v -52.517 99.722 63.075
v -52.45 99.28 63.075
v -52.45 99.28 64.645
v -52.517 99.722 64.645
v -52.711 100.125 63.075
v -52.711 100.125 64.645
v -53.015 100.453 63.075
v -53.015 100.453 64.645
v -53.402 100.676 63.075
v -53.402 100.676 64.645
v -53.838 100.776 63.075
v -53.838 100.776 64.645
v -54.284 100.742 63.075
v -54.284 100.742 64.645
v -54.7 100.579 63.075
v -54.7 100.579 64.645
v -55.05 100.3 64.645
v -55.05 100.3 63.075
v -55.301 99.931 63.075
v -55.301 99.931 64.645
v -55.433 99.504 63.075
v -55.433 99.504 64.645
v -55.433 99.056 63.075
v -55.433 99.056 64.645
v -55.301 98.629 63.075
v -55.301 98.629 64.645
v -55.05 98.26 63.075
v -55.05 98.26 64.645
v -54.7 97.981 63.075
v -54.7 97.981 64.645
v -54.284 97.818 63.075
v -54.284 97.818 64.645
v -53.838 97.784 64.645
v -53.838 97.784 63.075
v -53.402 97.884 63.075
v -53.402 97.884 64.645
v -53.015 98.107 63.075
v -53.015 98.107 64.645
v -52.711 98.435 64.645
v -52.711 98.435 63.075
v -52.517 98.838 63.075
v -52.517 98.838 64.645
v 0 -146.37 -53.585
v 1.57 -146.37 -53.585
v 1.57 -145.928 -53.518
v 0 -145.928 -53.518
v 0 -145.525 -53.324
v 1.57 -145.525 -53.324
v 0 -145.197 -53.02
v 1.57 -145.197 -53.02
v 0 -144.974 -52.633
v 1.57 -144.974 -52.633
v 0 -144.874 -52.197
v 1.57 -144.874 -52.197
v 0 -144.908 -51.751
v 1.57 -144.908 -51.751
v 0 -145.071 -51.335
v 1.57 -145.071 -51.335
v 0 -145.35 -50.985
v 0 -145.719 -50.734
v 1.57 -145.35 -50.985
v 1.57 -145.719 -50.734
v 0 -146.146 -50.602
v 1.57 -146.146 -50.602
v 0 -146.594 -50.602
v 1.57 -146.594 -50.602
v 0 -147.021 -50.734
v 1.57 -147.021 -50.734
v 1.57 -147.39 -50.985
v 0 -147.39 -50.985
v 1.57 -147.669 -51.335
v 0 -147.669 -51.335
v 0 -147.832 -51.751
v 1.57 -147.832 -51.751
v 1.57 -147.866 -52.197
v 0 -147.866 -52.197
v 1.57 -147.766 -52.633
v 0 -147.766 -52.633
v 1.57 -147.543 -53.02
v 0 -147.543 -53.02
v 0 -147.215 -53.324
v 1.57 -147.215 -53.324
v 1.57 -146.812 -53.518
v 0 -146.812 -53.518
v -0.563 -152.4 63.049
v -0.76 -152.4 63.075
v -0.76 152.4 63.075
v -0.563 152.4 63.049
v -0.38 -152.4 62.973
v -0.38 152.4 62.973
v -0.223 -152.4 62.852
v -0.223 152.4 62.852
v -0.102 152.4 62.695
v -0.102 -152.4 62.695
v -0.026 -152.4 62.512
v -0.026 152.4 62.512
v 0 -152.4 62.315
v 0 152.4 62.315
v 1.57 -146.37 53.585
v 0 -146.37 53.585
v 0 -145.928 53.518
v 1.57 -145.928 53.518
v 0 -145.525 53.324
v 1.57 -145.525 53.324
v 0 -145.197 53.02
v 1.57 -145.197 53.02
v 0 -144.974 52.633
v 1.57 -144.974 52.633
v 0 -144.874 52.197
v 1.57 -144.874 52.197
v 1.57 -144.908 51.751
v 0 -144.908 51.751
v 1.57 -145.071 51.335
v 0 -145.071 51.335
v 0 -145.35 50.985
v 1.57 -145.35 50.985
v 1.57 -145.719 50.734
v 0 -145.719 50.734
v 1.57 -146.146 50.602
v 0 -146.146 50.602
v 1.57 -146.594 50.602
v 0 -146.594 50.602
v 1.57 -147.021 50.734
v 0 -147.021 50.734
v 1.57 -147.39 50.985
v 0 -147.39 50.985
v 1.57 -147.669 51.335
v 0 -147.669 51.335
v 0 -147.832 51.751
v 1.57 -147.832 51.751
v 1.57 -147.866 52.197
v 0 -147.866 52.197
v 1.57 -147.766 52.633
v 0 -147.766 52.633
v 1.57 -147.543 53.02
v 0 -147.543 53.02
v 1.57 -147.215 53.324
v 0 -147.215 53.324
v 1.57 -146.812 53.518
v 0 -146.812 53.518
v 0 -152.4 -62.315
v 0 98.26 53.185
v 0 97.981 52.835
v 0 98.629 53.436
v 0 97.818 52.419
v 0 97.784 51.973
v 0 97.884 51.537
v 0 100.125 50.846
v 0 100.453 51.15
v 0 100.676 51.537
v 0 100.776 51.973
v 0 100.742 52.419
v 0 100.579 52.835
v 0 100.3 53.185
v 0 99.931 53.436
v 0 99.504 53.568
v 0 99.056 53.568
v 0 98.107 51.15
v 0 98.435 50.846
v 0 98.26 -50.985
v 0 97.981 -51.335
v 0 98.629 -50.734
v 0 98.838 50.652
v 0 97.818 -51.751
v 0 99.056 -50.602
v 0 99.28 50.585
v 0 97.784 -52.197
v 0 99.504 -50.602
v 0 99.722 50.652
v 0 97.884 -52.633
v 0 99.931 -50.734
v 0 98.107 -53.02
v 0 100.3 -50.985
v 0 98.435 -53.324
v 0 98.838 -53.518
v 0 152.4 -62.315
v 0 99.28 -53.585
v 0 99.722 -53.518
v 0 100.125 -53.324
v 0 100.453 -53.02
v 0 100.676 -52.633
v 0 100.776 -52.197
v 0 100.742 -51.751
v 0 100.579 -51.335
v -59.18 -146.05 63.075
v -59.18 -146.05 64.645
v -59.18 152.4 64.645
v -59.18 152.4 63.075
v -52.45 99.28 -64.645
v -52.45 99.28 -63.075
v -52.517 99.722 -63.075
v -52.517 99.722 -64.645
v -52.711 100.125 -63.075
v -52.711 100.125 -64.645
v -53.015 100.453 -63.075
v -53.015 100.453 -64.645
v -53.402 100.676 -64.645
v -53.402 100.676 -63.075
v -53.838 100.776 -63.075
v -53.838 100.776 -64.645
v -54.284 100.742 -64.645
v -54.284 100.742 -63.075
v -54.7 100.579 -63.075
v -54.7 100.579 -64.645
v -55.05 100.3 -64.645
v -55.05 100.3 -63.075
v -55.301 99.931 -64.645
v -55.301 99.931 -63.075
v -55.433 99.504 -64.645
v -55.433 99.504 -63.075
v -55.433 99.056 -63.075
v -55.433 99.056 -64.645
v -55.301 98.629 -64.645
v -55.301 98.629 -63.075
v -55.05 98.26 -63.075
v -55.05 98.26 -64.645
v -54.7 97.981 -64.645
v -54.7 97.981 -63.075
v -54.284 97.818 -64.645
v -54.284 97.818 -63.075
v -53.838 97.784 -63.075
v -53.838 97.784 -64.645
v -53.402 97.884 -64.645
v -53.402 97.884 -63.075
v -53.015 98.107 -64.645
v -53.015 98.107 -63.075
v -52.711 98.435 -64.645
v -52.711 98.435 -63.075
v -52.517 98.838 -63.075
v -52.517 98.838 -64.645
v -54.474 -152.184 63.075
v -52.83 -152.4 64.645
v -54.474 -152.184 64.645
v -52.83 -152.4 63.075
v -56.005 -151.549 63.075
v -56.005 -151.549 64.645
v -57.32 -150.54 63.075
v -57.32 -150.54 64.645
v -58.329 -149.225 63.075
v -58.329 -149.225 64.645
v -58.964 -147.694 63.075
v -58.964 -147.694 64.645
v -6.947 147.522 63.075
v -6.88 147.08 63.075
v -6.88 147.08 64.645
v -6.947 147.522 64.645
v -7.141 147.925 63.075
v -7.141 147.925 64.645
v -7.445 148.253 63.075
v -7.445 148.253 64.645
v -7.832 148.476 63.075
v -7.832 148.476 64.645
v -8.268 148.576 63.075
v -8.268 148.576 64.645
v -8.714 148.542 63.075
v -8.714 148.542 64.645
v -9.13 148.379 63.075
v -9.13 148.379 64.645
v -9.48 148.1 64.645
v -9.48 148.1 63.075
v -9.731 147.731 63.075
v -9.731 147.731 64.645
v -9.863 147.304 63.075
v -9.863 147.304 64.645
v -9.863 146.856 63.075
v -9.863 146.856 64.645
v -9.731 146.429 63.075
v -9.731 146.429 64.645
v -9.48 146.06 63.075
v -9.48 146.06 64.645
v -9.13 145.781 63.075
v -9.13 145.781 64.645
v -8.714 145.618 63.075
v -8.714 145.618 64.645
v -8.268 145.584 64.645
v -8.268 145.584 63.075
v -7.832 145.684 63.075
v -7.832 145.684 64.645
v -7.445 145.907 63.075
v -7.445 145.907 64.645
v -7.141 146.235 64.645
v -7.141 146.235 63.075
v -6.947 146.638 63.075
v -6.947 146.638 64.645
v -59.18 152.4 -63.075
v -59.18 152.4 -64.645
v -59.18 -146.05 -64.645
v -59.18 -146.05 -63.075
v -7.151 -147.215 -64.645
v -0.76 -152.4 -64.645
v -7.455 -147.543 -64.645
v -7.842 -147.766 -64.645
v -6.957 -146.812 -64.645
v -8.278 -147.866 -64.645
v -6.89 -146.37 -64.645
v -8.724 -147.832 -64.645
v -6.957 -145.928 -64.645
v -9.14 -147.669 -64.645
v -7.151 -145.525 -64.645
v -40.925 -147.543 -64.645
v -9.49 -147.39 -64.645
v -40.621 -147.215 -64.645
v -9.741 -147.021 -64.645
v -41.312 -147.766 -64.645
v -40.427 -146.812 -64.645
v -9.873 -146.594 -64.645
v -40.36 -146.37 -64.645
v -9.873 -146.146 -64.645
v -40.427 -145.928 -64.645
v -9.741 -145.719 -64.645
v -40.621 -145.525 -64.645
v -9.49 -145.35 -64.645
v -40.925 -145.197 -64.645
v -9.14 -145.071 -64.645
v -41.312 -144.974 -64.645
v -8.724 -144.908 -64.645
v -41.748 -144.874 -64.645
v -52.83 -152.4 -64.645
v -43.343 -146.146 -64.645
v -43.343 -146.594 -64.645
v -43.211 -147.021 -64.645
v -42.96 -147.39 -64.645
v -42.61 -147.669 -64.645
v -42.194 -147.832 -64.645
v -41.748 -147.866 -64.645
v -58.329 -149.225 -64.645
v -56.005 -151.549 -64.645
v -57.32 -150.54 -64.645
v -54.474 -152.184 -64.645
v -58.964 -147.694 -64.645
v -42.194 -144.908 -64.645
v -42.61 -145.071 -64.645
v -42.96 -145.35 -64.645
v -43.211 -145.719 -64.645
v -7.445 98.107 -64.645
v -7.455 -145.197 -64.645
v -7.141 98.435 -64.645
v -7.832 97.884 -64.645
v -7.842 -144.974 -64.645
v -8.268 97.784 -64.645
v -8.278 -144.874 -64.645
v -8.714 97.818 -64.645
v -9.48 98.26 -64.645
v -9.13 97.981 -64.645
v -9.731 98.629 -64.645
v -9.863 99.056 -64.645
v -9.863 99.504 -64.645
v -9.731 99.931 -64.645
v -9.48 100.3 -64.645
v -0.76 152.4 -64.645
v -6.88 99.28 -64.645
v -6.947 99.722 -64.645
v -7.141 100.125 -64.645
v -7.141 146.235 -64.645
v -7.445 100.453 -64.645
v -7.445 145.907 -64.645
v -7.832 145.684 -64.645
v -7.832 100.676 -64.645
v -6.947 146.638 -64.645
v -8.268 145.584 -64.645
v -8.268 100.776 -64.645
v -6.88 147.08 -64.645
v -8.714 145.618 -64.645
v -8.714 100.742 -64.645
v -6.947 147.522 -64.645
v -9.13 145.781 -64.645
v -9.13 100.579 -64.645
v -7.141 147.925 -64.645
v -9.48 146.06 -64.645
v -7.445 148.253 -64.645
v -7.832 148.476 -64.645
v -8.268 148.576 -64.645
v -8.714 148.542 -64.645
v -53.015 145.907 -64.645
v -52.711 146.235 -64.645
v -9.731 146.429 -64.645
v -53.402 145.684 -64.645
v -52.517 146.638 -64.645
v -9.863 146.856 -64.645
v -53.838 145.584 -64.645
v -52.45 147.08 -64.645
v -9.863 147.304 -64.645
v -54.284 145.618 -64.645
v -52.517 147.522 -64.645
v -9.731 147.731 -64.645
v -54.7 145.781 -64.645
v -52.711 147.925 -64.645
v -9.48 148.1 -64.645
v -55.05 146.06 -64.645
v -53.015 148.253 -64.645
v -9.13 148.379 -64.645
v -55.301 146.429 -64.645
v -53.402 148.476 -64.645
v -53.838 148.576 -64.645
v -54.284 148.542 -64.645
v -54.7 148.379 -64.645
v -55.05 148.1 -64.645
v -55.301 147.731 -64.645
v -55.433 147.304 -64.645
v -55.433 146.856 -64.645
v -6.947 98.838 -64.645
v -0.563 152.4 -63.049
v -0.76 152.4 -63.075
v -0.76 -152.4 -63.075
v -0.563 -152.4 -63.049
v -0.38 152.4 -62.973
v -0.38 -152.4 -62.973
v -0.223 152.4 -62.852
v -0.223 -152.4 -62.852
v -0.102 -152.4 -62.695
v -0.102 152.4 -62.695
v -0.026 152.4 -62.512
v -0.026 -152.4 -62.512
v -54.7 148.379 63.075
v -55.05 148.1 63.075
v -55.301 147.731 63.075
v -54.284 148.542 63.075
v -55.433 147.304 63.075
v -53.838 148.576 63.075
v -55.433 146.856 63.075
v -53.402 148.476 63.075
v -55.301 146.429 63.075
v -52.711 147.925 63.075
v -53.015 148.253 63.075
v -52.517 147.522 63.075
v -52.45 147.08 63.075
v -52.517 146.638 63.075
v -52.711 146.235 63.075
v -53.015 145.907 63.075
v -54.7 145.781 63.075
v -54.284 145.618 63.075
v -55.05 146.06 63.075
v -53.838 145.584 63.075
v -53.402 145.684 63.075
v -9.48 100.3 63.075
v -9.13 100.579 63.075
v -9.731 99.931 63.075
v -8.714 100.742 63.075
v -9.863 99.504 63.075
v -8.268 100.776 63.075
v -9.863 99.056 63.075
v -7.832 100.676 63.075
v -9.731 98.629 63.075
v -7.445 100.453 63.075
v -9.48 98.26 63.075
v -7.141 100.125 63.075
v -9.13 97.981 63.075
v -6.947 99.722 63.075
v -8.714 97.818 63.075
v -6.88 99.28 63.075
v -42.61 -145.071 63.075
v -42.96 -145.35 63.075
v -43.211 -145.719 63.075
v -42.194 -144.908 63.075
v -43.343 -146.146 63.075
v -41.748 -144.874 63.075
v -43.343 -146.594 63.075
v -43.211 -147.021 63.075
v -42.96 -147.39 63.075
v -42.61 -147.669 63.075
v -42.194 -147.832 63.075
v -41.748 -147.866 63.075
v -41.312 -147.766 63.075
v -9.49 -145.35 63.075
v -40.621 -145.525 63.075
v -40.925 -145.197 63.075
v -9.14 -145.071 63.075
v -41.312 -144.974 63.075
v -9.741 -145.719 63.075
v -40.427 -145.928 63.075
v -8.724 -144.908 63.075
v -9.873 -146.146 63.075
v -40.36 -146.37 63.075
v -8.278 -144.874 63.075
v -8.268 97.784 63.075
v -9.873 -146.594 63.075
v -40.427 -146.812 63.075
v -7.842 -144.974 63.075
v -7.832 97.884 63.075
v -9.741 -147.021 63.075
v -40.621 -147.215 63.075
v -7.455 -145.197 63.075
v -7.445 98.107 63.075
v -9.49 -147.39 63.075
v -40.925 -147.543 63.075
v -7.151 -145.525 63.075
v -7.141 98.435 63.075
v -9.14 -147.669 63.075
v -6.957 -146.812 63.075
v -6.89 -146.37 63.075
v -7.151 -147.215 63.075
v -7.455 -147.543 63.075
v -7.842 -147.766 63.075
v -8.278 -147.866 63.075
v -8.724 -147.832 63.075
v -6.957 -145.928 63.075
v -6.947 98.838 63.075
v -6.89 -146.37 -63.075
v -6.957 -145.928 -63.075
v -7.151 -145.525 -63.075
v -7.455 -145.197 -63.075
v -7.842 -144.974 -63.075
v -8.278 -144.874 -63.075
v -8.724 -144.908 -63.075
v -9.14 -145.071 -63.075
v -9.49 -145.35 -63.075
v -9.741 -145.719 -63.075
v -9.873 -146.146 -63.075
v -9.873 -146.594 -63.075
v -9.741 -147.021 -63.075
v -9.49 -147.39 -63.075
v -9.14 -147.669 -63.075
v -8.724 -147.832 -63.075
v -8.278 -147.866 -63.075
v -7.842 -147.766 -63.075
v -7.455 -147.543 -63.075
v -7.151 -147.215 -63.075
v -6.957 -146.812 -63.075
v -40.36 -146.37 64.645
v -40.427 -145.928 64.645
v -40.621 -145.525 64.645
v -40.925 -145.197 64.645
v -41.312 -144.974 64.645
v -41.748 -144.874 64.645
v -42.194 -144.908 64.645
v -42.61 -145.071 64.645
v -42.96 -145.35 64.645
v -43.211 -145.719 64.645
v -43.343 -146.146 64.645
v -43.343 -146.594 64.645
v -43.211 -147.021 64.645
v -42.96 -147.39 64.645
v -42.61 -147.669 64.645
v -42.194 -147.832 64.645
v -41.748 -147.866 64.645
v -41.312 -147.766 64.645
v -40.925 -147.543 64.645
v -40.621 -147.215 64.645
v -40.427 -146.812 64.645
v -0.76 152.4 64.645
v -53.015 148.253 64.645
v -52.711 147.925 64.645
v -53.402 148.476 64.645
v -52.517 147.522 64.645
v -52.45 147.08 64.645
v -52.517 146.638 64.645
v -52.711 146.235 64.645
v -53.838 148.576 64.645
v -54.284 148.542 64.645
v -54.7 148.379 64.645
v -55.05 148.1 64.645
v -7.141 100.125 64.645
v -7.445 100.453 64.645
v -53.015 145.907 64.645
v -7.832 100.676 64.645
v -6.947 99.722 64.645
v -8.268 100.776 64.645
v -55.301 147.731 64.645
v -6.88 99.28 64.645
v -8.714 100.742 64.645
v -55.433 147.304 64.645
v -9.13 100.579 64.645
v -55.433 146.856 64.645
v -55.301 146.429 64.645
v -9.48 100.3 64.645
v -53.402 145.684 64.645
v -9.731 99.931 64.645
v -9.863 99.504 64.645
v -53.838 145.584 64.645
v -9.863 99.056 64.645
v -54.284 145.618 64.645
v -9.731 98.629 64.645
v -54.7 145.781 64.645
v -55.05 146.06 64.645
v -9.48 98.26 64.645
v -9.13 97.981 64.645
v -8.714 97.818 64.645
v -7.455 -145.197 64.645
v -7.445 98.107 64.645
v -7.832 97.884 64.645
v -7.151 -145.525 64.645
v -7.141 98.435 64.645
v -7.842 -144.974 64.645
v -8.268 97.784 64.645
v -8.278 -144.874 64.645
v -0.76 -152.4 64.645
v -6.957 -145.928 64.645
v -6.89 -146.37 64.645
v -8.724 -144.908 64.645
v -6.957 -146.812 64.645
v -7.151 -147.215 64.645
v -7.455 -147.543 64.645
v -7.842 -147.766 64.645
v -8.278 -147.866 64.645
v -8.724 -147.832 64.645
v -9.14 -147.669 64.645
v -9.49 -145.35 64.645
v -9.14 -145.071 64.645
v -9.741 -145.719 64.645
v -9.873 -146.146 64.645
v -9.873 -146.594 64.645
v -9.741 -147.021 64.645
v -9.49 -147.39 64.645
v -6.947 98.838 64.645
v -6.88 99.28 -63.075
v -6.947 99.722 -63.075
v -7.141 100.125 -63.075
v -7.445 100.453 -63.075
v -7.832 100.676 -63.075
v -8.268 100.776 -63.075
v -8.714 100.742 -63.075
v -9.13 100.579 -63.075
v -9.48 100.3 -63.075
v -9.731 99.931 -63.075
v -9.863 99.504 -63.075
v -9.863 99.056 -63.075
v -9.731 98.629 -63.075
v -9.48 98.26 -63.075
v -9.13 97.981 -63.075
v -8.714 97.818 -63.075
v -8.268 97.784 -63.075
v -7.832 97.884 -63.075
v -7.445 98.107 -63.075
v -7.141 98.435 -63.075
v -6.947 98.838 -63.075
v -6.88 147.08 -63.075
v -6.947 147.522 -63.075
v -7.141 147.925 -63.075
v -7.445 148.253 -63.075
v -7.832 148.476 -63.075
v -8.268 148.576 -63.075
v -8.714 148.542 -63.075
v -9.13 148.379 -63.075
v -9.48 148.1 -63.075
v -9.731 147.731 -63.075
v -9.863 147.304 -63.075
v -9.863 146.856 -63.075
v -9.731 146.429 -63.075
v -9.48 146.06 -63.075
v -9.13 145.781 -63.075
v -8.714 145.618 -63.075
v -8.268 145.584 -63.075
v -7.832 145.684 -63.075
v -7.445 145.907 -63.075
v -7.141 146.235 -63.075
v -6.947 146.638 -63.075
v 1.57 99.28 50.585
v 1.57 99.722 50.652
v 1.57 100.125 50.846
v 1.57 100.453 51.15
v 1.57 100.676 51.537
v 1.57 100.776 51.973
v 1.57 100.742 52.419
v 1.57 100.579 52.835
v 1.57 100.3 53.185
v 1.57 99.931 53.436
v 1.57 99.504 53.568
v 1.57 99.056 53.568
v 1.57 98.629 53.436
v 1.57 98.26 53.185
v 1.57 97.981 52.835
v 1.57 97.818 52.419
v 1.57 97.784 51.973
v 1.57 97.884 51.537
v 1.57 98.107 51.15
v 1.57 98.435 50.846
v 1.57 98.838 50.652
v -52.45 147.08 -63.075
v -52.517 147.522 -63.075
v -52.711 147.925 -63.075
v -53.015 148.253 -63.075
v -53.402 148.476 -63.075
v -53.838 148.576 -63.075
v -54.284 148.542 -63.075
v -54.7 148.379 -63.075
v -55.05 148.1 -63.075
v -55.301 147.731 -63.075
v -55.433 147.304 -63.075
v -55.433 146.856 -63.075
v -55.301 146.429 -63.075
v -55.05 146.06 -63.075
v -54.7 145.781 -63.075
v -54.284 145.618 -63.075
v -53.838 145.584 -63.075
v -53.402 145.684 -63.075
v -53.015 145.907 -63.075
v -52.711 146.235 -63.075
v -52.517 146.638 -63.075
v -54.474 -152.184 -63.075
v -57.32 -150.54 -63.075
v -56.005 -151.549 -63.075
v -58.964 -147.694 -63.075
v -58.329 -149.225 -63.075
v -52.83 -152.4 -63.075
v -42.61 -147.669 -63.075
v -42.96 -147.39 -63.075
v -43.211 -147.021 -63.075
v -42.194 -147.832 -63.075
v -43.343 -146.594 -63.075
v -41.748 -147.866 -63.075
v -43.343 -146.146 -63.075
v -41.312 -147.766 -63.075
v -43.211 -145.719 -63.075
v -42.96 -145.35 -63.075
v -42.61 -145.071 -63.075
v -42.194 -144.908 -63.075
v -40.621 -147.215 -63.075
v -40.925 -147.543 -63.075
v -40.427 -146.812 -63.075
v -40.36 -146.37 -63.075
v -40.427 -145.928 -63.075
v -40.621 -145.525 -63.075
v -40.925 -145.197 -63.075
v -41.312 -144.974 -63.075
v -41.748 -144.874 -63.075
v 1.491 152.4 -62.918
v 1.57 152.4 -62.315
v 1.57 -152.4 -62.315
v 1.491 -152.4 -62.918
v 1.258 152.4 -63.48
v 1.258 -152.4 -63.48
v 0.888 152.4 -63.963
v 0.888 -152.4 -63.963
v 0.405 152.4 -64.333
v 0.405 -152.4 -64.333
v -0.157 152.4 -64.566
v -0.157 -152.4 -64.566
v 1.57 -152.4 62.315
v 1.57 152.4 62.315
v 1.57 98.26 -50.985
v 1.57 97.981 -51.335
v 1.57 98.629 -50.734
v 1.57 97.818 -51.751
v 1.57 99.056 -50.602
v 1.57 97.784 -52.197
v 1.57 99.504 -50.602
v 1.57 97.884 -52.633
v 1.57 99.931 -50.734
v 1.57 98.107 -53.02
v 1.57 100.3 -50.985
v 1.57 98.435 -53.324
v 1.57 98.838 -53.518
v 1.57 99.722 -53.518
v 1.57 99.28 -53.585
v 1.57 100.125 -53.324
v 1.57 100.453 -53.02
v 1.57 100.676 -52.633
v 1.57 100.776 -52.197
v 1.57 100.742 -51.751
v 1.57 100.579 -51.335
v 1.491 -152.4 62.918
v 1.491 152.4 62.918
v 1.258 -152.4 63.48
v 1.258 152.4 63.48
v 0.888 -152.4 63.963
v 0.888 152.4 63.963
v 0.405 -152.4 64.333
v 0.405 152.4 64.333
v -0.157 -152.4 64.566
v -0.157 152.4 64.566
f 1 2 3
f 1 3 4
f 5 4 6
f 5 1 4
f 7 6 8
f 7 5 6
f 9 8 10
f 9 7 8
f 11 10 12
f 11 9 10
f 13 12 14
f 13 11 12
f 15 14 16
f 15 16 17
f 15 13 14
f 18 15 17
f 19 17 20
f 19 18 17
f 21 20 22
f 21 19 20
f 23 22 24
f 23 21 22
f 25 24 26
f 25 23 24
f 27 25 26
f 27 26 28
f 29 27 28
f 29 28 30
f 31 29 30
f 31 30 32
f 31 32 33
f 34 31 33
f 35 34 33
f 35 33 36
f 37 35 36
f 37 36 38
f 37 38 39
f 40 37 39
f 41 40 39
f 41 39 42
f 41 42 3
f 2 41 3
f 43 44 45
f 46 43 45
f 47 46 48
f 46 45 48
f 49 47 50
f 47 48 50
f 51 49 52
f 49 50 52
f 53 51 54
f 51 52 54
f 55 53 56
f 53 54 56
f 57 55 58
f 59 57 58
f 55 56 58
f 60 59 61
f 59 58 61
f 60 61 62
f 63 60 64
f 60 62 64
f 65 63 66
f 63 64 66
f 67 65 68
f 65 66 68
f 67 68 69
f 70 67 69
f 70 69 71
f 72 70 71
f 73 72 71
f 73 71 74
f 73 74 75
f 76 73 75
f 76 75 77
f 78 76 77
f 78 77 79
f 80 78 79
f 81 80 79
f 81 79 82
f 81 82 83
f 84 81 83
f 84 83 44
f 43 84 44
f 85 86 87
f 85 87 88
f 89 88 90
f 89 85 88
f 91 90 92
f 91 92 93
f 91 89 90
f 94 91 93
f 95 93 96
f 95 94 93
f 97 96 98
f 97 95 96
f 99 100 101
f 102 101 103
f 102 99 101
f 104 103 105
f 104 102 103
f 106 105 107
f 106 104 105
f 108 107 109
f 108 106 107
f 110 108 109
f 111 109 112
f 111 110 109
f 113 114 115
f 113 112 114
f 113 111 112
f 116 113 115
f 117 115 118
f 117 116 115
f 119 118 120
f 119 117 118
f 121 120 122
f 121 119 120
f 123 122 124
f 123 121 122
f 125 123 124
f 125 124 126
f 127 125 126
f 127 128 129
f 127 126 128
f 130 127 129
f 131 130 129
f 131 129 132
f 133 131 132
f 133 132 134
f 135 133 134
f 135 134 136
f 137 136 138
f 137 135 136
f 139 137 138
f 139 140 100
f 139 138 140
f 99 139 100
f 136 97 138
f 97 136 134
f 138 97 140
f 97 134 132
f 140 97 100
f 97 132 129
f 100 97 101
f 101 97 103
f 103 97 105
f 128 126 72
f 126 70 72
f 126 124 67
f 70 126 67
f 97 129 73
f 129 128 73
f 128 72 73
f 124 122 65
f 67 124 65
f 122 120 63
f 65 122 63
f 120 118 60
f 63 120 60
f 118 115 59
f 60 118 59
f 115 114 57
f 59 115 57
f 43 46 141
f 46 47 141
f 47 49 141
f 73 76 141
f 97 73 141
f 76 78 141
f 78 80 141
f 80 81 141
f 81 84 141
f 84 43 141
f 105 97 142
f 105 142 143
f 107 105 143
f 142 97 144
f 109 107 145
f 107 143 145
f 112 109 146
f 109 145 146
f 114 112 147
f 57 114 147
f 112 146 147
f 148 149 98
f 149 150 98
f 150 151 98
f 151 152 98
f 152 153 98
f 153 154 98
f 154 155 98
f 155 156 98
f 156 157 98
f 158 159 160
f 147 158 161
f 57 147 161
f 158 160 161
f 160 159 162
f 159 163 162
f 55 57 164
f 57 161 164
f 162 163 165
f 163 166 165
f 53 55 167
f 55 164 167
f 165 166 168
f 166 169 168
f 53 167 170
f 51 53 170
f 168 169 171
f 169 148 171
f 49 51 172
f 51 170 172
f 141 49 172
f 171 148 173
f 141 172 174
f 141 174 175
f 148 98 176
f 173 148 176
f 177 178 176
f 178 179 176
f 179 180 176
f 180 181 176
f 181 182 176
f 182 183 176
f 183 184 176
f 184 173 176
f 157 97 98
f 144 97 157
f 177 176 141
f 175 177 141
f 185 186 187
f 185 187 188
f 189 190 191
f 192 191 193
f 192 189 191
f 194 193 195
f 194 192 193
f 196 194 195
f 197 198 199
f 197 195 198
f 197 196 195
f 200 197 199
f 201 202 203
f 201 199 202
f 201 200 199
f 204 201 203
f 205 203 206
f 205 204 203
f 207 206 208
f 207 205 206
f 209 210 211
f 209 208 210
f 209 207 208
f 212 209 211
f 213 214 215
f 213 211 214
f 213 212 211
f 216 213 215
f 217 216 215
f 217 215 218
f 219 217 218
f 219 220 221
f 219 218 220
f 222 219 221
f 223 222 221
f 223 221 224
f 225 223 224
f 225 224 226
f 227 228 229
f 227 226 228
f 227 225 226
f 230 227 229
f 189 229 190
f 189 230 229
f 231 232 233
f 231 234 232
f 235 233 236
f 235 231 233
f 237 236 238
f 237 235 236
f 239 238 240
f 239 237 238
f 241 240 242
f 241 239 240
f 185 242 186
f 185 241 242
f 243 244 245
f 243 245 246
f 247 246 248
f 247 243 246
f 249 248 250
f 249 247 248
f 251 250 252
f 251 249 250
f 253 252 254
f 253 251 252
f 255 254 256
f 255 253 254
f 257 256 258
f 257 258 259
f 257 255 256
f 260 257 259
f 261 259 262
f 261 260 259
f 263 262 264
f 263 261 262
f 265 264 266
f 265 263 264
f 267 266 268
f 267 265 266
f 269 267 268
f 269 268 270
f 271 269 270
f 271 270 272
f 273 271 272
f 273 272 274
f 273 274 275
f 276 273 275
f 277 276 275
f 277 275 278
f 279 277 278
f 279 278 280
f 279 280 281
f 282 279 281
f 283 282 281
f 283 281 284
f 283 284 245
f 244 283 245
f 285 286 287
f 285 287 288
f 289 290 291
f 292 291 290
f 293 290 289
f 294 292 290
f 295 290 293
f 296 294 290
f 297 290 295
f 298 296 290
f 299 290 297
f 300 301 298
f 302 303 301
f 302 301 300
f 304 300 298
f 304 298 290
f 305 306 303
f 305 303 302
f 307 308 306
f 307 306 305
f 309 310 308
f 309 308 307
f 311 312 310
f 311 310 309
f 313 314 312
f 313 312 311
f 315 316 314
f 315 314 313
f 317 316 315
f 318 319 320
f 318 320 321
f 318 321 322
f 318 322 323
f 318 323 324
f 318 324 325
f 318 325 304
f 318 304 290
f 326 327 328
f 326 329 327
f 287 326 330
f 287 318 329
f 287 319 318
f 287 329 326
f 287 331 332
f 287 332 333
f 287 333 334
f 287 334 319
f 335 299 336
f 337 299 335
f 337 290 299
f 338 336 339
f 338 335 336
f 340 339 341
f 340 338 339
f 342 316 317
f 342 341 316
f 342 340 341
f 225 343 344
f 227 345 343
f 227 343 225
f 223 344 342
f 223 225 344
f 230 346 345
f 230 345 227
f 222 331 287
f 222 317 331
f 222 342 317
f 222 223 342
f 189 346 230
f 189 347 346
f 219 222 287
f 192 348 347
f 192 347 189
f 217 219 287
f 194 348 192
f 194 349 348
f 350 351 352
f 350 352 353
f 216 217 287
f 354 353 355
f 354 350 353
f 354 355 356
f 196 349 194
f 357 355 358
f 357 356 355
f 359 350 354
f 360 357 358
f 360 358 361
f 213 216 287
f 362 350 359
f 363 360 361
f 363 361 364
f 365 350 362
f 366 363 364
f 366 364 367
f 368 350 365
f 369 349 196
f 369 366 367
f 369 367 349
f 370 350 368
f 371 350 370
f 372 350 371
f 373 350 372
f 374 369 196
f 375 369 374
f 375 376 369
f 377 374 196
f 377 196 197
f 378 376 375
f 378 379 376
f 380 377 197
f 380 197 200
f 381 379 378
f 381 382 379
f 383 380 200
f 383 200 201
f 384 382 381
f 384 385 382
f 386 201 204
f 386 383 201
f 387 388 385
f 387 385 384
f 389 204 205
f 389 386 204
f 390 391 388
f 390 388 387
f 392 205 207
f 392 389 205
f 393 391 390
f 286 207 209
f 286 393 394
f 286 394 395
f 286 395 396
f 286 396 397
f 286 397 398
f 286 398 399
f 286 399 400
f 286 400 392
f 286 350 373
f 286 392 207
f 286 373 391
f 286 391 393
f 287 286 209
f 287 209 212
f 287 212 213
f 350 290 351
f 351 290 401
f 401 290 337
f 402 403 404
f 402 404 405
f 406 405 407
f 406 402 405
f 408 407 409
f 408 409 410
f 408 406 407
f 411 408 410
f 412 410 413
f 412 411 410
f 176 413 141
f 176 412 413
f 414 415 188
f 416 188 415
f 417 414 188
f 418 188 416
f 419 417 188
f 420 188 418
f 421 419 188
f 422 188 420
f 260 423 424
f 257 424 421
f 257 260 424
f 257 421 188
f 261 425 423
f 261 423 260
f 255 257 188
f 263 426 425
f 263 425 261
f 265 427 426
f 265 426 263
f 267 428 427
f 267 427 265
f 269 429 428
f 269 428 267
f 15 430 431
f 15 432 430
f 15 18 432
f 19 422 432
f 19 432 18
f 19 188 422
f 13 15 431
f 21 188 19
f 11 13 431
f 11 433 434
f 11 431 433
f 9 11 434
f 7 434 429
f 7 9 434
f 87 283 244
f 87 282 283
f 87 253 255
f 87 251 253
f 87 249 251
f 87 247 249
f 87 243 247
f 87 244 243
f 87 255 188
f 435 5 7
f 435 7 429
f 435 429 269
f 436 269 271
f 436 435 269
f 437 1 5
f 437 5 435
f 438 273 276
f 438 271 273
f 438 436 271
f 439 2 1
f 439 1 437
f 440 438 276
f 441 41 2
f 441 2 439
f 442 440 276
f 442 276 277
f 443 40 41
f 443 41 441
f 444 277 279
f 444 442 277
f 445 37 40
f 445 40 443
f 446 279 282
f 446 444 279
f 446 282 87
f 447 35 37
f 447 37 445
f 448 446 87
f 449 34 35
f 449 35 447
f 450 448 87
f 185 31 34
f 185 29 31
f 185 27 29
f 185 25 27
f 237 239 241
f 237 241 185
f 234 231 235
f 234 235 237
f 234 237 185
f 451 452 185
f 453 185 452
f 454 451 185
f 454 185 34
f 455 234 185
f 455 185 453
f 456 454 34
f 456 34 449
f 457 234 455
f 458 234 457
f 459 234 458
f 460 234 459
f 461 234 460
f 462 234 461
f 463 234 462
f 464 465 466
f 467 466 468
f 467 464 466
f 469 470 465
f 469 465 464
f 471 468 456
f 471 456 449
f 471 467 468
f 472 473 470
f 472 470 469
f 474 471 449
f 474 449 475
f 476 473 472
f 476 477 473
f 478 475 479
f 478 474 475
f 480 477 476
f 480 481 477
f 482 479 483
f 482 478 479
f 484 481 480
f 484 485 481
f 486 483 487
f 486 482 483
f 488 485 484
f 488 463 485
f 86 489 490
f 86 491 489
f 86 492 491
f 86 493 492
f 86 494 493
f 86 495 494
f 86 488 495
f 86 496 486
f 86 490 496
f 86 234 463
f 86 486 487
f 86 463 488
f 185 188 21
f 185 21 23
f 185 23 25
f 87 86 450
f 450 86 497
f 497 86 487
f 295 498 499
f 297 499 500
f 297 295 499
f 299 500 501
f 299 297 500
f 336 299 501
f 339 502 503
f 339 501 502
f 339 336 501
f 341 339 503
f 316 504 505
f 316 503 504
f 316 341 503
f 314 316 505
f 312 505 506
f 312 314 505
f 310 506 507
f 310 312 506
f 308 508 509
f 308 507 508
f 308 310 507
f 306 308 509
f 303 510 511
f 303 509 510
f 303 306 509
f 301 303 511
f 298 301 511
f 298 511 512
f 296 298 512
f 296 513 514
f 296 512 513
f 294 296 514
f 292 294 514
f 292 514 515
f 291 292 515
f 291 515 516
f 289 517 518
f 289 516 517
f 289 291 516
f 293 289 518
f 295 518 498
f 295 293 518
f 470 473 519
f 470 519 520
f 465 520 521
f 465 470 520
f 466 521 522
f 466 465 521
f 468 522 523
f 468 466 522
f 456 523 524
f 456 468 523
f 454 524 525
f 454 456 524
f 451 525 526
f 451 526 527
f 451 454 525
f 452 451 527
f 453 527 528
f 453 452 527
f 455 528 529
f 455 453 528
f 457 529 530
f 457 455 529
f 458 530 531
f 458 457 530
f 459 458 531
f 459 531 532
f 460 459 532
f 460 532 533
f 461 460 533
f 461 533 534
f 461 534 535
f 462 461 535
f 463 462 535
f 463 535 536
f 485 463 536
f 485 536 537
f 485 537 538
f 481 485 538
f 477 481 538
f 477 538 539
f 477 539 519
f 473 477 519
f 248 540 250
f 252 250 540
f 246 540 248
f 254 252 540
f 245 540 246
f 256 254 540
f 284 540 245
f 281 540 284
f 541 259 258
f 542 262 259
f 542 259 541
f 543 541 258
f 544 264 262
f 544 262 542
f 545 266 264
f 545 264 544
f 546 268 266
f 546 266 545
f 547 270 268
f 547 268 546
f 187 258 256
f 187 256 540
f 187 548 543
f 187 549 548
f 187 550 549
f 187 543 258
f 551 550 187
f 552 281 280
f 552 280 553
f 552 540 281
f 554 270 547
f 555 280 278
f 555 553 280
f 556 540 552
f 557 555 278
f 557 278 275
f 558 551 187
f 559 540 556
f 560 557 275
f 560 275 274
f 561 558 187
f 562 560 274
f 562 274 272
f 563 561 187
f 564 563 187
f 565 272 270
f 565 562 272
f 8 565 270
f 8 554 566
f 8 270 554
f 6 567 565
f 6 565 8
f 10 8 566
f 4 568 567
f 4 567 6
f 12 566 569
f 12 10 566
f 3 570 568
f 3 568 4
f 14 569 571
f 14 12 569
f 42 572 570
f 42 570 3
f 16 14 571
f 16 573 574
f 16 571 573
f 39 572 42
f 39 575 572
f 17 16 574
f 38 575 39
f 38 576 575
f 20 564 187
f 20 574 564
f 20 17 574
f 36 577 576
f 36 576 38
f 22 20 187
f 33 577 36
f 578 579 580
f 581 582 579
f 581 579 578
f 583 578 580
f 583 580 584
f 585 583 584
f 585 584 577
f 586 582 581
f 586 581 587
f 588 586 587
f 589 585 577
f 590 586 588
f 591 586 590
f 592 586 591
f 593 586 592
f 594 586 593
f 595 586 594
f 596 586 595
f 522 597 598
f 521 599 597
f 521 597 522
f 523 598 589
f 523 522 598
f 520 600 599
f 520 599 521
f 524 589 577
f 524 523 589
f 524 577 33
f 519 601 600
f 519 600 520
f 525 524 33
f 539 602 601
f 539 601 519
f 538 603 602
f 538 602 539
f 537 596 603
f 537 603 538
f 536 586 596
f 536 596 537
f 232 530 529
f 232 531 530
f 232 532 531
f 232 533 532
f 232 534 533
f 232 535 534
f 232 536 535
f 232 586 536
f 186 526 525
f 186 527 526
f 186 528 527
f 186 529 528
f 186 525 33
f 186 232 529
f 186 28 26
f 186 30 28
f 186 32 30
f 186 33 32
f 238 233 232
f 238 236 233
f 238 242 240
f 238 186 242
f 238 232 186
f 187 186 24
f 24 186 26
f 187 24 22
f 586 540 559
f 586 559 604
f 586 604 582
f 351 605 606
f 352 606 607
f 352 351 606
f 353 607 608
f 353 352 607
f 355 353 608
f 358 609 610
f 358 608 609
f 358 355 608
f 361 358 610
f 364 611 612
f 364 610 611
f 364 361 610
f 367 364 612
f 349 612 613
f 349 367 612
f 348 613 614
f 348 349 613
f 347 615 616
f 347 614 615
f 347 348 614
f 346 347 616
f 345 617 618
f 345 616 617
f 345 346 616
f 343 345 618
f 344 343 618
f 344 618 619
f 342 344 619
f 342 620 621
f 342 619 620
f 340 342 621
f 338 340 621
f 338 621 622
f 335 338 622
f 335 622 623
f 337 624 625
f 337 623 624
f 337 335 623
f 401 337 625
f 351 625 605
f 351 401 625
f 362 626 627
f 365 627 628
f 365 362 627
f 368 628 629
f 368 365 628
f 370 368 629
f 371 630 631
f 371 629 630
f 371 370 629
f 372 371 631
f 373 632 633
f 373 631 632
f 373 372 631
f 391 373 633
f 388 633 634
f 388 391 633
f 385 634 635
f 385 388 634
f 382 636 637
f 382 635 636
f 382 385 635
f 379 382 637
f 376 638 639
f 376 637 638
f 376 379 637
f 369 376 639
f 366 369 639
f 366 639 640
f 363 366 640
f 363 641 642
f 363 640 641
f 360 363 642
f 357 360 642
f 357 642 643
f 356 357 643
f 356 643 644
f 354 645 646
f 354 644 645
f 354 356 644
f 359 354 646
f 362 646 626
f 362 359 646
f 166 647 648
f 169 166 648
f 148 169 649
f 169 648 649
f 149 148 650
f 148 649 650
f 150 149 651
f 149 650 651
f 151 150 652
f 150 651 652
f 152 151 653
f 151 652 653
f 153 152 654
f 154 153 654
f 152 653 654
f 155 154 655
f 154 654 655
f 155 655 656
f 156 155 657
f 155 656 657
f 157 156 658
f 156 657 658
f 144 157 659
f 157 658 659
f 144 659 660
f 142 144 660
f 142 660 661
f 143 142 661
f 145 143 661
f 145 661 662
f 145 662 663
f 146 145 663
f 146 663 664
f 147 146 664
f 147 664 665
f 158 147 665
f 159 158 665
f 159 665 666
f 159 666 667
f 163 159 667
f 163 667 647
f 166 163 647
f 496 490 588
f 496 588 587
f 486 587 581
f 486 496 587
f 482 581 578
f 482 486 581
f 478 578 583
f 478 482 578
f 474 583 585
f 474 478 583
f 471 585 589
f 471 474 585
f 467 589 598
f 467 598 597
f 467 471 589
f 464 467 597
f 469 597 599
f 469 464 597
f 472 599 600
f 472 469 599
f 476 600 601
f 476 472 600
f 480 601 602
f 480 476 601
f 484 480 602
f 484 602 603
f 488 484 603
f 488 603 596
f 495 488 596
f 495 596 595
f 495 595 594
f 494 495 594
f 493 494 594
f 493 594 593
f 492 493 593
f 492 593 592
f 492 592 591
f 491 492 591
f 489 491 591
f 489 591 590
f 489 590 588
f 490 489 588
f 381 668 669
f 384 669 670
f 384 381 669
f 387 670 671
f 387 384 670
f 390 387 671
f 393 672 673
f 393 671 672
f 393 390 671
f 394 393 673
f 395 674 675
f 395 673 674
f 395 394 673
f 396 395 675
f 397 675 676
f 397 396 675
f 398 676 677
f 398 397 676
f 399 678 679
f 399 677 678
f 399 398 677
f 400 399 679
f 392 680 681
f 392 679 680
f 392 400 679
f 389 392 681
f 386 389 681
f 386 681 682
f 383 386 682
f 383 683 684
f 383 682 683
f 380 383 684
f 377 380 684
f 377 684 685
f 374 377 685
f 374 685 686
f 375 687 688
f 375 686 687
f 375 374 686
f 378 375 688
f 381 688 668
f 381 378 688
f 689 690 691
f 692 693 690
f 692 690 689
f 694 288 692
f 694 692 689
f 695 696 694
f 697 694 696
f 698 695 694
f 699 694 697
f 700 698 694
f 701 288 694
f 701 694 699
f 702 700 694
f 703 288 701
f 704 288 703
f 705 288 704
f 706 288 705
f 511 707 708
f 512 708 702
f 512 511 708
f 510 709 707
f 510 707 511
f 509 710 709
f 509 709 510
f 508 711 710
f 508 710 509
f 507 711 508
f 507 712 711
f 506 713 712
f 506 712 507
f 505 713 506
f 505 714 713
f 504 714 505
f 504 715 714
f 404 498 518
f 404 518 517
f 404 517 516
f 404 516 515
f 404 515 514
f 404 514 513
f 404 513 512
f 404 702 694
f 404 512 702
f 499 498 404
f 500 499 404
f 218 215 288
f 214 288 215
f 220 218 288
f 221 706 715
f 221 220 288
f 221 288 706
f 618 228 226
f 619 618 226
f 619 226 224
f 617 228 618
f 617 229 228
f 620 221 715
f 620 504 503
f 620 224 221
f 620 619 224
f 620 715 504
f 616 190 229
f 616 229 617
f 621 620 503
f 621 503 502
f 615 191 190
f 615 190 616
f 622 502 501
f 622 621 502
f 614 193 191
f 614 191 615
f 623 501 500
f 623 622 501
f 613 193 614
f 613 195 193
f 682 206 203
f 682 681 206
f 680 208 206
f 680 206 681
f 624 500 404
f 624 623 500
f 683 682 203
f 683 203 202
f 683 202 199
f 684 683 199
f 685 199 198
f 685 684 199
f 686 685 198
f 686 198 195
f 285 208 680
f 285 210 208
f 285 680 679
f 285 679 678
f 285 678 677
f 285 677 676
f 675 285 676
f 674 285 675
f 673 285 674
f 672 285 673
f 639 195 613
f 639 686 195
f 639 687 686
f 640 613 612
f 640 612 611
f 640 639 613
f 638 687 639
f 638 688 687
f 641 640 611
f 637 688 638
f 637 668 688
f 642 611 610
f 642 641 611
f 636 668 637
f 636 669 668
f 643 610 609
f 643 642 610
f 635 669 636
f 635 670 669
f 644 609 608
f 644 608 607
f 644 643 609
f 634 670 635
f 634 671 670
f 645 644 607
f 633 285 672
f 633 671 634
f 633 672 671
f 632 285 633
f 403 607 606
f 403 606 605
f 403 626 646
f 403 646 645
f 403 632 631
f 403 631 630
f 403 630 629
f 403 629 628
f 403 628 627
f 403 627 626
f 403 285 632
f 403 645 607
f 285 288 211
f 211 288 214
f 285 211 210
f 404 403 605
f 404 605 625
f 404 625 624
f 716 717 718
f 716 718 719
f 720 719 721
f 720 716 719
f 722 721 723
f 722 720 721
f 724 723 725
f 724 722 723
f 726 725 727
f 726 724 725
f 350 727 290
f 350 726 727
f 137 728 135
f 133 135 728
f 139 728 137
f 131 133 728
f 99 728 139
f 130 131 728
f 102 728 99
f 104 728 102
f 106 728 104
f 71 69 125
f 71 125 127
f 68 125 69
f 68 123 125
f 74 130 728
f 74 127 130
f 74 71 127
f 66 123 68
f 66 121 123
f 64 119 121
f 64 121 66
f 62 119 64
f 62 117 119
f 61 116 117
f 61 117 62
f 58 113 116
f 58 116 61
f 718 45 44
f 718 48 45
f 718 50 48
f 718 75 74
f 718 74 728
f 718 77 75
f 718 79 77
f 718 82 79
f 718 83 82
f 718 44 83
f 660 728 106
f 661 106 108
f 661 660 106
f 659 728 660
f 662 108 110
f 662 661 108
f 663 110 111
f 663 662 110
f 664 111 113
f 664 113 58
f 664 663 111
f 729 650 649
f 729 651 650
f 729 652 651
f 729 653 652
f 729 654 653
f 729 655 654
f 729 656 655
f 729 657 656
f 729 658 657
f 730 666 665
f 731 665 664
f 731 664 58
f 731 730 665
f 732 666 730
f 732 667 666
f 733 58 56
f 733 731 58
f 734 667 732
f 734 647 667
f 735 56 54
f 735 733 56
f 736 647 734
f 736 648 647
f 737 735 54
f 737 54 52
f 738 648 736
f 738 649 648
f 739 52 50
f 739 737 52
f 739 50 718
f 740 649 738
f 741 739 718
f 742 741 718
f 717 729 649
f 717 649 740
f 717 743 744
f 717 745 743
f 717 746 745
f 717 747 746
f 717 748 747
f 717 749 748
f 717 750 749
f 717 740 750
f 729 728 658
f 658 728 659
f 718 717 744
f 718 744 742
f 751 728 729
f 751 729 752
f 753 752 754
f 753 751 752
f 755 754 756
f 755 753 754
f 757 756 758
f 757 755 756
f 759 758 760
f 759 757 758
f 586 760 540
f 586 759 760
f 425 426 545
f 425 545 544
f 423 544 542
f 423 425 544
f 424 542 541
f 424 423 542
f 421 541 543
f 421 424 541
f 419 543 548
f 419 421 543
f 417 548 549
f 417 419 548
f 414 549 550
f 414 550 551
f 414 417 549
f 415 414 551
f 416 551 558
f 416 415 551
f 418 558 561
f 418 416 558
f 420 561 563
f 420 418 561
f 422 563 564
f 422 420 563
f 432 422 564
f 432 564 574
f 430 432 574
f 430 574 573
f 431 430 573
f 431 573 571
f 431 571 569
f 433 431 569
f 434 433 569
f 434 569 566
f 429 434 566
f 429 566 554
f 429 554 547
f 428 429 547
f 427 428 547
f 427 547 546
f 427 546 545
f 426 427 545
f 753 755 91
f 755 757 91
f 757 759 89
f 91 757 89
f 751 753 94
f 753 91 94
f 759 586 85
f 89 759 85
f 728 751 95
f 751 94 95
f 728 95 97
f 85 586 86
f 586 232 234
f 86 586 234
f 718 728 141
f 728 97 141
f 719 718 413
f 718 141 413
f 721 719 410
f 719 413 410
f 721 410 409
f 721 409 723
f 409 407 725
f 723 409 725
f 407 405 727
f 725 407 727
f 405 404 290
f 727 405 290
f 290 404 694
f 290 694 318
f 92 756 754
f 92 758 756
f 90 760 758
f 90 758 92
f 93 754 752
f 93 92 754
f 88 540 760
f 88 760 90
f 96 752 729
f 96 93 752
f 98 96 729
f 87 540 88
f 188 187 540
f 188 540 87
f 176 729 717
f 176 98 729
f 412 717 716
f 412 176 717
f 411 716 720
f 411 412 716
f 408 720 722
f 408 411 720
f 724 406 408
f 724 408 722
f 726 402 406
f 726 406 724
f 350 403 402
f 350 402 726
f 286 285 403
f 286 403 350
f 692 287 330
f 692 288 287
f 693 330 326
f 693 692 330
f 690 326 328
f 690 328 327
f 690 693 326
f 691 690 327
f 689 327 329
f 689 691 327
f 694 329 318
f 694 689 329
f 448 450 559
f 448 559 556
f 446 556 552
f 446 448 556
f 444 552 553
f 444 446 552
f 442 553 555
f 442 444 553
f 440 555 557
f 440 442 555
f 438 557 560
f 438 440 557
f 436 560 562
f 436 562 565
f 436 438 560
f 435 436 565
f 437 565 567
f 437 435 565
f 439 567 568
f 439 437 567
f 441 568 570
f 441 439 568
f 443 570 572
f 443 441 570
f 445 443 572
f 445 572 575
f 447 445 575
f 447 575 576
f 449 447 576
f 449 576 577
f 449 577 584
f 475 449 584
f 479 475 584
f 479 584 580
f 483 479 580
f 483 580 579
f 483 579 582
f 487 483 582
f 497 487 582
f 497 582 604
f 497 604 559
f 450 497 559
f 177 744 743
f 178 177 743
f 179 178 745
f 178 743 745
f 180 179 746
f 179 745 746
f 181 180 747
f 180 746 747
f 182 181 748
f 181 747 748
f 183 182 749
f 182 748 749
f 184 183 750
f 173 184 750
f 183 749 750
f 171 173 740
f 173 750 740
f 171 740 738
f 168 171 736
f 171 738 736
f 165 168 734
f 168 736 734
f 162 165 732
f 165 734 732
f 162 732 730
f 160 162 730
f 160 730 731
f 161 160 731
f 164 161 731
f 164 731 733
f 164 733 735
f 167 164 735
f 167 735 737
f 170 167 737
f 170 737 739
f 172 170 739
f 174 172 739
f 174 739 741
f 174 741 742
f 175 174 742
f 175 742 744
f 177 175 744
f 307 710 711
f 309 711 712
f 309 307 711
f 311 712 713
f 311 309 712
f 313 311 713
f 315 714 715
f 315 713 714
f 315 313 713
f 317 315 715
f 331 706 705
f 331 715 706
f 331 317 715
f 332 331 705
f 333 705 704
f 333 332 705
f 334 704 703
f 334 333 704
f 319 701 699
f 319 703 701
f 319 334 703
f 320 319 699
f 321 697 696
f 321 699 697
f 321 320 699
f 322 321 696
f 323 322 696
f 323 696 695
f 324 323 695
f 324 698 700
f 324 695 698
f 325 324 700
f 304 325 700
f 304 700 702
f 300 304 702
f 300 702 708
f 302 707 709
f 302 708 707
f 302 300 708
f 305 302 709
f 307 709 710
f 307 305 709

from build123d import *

# Parameters (mm, degrees)
SKETCH1_W               = 124.63
SKETCH1_H               = 304.8
BASE_FLANGE1_DEPTH      = 1.57
EDGE_FLANGE1_DEPTH      = 304.8
EDGE_FLANGE1_BEND_DEPTH = 304.8
FILLET1_R               = 6.35
HOLE1_START             = -64.645
HOLE1_OUTLINE_R         = 1.5
HOLE1_DEPTH             = 129.29
HOLE2_START             = -64.645
HOLE2_OUTLINE_R         = 1.5
HOLE2_DEPTH             = 129.29
SKETCH18_R              = 1.5
CUT_EXTRUDE1_DEPTH      = 10
SKETCH19_R              = 1.5
CUT_EXTRUDE2_DEPTH      = 10


# Read off the part's stored shape, not the designer's step: Hole1, Hole2
# Sheet-metal steps are written as plain solids
with BuildPart() as part:
    # Sketch1 → Base-Flange1 (new body)
    with BuildSketch(Plane(origin=(0, 0, 0), x_dir=(0, 0, -1), z_dir=(1, 0, 0))):
        Rectangle(SKETCH1_W, SKETCH1_H)
    extrude(amount=BASE_FLANGE1_DEPTH)

    # Edge-Flange1 section (across the edge) → Edge-Flange1 (add)
    with BuildSketch(Plane(origin=(0, -152.4, 63.075), x_dir=(0, 0, -1), z_dir=(0, 1, 0))):
        with BuildLine():
            Line((-1.57, 0.76), (-1.57, 59.18))
            Line((-1.57, 59.18), (0, 59.18))
            Line((0, 59.18), (0, 0.76))
            ThreePointArc((0, 0.76), (0.222598846, 0.222598846), (0.76, 0))
            Line((0.76, 0), (0.76, -1.57))
            ThreePointArc((0.76, -1.57), (-0.8875588, -0.8875588), (-1.57, 0.76))
        make_face()
    extrude(amount=EDGE_FLANGE1_DEPTH)

    # Edge-Flange1 section 2 (across the edge) → Edge-Flange1 bend (add)
    with BuildSketch(Plane(origin=(0, 152.4, -63.075), x_dir=(0, 0, 1), z_dir=(0, -1, 0))):
        with BuildLine():
            Line((-1.57, 0.76), (-1.57, 59.18))
            Line((-1.57, 59.18), (0, 59.18))
            Line((0, 59.18), (0, 0.76))
            ThreePointArc((0, 0.76), (0.222598846, 0.222598846), (0.76, 0))
            Line((0.76, 0), (0.76, -1.57))
            ThreePointArc((0.76, -1.57), (-0.8875588, -0.8875588), (-1.57, 0.76))
        make_face()
    extrude(amount=EDGE_FLANGE1_BEND_DEPTH)

    # Fillet1
    fillet1_edges = [part.edges().sort_by_distance(p)[0] for p in [
        (-59.18, -152.4, 63.86),
        (-59.18, -152.4, -63.86),
    ]]
    fillet(fillet1_edges, radius=FILLET1_R)

    # Hole1 outline → Hole1 (cut)
    with BuildSketch(Plane.XY.offset(HOLE1_START)):
        with Locations((-8.39, -146.37)):
            Circle(HOLE1_OUTLINE_R)
        with Locations((-41.86, -146.37)):
            Circle(HOLE1_OUTLINE_R)
    extrude(amount=HOLE1_DEPTH, mode=Mode.SUBTRACT)

    # Hole2 outline → Hole2 (cut)
    with BuildSketch(Plane.XY.offset(HOLE2_START)):
        with Locations((-53.95, 147.08)):
            Circle(HOLE2_OUTLINE_R)
        with Locations((-8.38, 147.08)):
            Circle(HOLE2_OUTLINE_R)
        with Locations((-8.38, 99.28)):
            Circle(HOLE2_OUTLINE_R)
        with Locations((-53.95, 99.28)):
            Circle(HOLE2_OUTLINE_R)
    extrude(amount=HOLE2_DEPTH, mode=Mode.SUBTRACT)

    # Sketch18 → Cut-Extrude1 (cut)
    with BuildSketch(Plane(origin=(1.57, 0, 0), x_dir=(0, 0, -1), z_dir=(1, 0, 0))):
        with Locations((52.085, -146.37)):
            Circle(SKETCH18_R)
    cut_extrude1 = extrude(amount=-CUT_EXTRUDE1_DEPTH, mode=Mode.SUBTRACT)

    # Mirror1: Cut-Extrude1 across plane
    add(cut_extrude1.mirror(Plane.XY), mode=Mode.SUBTRACT)

    # Sketch19 → Cut-Extrude2 (cut)
    with BuildSketch(Plane(origin=(1.57, 0, 0), x_dir=(0, 0, -1), z_dir=(1, 0, 0))):
        with Locations((52.085, 99.28)):
            Circle(SKETCH19_R)
        with Locations((-52.085, 99.28)):
            Circle(SKETCH19_R)
    extrude(amount=-CUT_EXTRUDE2_DEPTH, mode=Mode.SUBTRACT)


solid = part.part
